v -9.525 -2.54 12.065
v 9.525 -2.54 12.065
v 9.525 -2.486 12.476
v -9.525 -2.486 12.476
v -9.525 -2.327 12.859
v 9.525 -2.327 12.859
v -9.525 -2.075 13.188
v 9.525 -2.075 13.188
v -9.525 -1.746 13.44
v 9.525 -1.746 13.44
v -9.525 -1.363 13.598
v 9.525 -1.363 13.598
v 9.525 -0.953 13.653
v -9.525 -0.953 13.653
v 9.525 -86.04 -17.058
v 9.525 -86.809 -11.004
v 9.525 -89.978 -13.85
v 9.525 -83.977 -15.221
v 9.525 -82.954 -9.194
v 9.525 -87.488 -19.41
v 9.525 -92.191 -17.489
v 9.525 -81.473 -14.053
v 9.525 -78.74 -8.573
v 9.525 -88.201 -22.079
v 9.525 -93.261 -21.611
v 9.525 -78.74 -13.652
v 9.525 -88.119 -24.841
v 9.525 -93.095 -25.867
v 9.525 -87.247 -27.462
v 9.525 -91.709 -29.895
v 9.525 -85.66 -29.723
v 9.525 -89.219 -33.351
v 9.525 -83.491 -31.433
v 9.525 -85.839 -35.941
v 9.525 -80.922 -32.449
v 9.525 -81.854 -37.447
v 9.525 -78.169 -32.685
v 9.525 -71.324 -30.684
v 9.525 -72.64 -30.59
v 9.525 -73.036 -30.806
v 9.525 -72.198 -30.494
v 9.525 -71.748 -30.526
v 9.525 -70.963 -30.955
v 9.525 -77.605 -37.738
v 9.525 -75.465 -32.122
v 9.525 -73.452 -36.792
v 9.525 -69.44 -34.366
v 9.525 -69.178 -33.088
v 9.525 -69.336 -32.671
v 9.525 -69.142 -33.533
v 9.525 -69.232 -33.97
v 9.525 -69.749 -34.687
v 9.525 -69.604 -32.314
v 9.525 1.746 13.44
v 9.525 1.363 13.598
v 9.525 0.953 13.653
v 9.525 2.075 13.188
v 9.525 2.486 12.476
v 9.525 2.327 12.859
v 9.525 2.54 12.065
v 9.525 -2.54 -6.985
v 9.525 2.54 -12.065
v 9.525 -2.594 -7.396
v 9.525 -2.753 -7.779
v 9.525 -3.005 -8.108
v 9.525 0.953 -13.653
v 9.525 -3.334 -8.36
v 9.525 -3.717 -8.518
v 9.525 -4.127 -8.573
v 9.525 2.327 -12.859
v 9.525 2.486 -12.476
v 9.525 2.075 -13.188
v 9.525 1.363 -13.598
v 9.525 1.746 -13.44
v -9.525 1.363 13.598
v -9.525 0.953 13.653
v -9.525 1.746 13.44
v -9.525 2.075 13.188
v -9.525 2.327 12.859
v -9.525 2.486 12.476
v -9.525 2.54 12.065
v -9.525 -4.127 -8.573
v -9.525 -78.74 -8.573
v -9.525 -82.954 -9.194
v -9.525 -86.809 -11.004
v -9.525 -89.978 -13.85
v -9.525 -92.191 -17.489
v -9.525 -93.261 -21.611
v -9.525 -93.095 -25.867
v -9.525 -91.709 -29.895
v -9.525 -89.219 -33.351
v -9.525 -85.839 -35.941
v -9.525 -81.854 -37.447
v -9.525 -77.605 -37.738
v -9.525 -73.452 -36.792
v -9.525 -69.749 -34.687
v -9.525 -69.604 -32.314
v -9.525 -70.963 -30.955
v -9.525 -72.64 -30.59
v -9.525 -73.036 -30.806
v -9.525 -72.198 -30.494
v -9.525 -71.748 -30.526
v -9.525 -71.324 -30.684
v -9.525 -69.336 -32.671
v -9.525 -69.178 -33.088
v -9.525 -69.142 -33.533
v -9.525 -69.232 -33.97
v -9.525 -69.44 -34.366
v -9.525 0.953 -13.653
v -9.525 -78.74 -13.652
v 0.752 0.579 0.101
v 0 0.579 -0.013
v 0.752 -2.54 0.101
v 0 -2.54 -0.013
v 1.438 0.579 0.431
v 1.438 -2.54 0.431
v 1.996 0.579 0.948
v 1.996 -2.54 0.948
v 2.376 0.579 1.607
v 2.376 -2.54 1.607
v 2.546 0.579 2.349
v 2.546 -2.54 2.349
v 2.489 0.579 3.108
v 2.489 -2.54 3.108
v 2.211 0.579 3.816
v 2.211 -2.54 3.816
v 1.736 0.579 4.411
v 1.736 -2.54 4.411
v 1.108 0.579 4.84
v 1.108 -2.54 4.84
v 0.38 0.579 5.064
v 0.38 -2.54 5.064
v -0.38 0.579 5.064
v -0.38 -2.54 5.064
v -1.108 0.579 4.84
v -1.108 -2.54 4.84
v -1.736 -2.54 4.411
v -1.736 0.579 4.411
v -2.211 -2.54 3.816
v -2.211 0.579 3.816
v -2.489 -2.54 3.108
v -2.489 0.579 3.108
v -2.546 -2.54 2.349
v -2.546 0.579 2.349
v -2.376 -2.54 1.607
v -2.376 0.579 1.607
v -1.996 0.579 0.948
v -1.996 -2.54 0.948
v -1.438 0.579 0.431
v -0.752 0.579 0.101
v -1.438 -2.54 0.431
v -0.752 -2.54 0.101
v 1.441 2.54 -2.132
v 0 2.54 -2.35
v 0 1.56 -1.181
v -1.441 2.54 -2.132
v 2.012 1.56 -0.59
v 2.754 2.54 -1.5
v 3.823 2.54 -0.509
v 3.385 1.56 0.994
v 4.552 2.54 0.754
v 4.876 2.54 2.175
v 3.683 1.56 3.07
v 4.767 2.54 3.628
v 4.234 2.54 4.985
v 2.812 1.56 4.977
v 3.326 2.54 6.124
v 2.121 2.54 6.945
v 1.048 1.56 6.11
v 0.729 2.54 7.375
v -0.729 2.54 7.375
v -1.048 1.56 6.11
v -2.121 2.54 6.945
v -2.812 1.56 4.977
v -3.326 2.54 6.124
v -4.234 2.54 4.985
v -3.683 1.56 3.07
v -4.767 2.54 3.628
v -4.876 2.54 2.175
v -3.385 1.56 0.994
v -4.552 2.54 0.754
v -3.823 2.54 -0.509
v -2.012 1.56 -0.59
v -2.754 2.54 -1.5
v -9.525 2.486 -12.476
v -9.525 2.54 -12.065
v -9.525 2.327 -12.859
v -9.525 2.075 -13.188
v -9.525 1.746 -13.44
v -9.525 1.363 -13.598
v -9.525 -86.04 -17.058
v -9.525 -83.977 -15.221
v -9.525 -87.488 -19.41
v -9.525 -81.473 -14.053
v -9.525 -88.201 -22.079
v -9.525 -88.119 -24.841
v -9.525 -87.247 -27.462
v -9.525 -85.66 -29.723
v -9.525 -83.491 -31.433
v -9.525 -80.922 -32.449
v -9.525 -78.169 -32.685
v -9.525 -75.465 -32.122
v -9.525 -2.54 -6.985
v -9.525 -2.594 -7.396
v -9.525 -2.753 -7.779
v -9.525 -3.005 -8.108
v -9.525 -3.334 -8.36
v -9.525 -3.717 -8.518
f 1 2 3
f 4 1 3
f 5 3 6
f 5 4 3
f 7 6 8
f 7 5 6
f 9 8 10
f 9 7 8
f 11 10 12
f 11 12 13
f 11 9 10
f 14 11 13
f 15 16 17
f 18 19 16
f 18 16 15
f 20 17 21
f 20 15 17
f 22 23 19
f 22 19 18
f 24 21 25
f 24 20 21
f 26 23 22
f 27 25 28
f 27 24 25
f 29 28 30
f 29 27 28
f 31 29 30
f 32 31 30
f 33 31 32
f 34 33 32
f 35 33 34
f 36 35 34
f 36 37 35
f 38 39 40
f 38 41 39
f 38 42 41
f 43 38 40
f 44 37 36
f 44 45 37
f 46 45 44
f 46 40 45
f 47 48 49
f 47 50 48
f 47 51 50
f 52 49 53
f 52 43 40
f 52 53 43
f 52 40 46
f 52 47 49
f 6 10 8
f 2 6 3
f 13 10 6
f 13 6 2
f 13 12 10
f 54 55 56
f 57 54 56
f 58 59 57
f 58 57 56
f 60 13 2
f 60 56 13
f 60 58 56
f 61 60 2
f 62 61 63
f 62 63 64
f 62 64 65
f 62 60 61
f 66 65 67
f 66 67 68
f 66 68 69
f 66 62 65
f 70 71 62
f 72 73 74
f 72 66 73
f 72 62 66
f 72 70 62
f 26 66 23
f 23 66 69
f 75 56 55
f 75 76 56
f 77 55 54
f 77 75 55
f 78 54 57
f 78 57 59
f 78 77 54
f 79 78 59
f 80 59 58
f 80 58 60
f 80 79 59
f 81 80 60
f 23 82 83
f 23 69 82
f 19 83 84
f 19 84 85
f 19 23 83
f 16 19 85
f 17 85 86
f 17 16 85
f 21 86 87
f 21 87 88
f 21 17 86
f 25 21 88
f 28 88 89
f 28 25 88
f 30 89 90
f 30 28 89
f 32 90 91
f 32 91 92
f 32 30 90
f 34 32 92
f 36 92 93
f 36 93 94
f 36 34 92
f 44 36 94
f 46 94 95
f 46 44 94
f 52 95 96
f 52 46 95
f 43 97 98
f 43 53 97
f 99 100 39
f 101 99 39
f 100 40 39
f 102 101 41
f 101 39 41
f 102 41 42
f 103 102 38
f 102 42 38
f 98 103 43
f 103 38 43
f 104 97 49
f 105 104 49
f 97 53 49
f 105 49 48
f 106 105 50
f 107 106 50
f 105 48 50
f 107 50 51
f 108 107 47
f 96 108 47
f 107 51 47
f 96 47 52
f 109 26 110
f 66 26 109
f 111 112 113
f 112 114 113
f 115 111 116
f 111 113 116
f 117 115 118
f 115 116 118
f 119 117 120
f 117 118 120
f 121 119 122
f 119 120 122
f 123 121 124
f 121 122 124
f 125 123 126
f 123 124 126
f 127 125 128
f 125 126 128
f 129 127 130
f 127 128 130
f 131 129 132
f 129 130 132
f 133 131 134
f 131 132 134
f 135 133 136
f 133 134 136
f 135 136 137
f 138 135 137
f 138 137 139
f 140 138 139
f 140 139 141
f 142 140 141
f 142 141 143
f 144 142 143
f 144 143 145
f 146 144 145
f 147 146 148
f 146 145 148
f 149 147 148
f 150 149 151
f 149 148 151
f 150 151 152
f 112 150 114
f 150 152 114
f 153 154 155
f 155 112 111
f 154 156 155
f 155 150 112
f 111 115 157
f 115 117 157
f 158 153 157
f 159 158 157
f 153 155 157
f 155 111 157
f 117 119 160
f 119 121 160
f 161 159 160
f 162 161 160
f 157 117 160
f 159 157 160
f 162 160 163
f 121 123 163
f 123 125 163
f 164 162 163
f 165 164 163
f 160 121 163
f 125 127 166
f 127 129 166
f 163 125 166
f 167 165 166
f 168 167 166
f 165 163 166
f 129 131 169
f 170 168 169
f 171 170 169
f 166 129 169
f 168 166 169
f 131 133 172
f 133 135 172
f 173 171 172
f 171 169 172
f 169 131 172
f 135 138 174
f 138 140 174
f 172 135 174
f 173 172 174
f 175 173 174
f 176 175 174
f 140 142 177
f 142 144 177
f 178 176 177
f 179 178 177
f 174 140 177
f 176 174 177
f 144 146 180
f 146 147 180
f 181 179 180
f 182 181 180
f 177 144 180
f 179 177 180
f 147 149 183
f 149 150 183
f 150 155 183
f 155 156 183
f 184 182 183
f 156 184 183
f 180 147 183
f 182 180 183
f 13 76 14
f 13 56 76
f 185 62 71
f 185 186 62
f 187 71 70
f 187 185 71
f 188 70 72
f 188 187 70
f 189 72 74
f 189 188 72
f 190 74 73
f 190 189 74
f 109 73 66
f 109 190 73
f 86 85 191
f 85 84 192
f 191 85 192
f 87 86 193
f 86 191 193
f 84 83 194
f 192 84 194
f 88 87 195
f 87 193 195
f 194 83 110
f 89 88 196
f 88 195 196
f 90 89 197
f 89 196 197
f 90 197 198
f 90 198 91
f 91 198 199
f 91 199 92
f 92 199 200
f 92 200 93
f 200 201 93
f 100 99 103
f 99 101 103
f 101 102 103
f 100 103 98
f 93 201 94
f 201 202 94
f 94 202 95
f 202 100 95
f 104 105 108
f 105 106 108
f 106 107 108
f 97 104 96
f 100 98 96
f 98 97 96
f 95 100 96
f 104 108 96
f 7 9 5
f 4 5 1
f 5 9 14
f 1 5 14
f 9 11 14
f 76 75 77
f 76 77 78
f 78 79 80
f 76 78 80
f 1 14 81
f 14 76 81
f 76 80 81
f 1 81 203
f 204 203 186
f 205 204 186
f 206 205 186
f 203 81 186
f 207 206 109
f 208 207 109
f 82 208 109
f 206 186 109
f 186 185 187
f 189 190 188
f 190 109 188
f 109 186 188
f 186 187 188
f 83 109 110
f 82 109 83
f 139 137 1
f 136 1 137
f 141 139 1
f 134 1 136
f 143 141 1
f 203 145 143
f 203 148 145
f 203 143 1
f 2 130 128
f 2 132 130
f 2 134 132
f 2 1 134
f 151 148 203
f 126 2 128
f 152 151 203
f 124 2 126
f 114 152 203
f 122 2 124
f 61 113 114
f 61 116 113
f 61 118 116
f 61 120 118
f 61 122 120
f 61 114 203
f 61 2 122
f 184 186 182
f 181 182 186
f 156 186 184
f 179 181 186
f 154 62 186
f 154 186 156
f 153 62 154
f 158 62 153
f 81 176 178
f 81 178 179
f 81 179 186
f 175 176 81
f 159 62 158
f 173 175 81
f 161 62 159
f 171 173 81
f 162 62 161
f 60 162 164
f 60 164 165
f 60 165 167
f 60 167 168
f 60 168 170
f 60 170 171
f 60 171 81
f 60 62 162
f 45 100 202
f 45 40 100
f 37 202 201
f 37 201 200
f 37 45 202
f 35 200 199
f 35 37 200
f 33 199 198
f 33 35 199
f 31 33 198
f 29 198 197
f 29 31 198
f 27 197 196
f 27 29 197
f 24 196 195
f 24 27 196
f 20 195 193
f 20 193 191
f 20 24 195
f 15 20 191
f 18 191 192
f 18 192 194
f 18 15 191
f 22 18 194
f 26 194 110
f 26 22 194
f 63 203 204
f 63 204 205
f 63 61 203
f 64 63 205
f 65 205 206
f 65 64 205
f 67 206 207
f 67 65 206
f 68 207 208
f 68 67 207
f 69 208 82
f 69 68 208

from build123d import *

# Parameters (mm, degrees)
BOSS_EXTRUDE1_DEPTH                                = 9.525
FILLET1_R                                          = 1.5875
CSK_FOR_10_FLAT_HEAD_MACHINE_SCREW_100_D           = 5.1054
CSK_FOR_10_FLAT_HEAD_MACHINE_SCREW_100_CSINK_D     = 9.779
CSK_FOR_10_FLAT_HEAD_MACHINE_SCREW_100_CSINK_ANGLE = 100


with BuildPart() as part:
    # Sketch1 → Boss-Extrude1 (new body, symmetric)
    with BuildSketch(Plane(origin=(0, 0, 0), x_dir=(0, 0, -1), z_dir=(1, 0, 0))):
        with BuildLine():
            Line((-13.6525, -2.54), (8.5725, -2.54))
            Line((8.5725, -2.54), (8.5725, -78.74))
            ThreePointArc((8.5725, -78.74), (28.76659153, -92.233260572), (33.504794539, -68.412705461))
            Line((33.504794539, -68.412705461), (29.912692091, -72.004807909))
            ThreePointArc((29.912692091, -72.004807909), (26.822559693, -87.539952547), (13.6525, -78.74))
            Line((13.6525, -78.74), (13.6525, 2.54))
            Line((13.6525, 2.54), (-13.6525, 2.54))
            Line((-13.6525, 2.54), (-13.6525, -2.54))
        make_face()
    extrude(amount=BOSS_EXTRUDE1_DEPTH, both=True)

    # Fillet1
    fillet1_edges = [part.edges().sort_by_distance(p)[0] for p in [
        (0, -72.004807909, -29.912692091),
        (0, -68.412705461, -33.504794539),
        (0, -2.54, -8.5725),
        (0, -2.54, 13.6525),
        (0, 2.54, 13.6525),
        (0, 2.54, -13.6525),
    ]]
    fillet(fillet1_edges, radius=FILLET1_R)

    # CSK for #10 Flat Head Machine Screw (100)1 (through all)
    with Locations(Plane(origin=(0, 2.54, 2.54), x_dir=(0, 0, 1), z_dir=(0, 1, 0))):
        with Locations((0, 0)):
            CounterSinkHole(CSK_FOR_10_FLAT_HEAD_MACHINE_SCREW_100_D / 2, CSK_FOR_10_FLAT_HEAD_MACHINE_SCREW_100_CSINK_D / 2, counter_sink_angle=CSK_FOR_10_FLAT_HEAD_MACHINE_SCREW_100_CSINK_ANGLE)


solid = part.part
